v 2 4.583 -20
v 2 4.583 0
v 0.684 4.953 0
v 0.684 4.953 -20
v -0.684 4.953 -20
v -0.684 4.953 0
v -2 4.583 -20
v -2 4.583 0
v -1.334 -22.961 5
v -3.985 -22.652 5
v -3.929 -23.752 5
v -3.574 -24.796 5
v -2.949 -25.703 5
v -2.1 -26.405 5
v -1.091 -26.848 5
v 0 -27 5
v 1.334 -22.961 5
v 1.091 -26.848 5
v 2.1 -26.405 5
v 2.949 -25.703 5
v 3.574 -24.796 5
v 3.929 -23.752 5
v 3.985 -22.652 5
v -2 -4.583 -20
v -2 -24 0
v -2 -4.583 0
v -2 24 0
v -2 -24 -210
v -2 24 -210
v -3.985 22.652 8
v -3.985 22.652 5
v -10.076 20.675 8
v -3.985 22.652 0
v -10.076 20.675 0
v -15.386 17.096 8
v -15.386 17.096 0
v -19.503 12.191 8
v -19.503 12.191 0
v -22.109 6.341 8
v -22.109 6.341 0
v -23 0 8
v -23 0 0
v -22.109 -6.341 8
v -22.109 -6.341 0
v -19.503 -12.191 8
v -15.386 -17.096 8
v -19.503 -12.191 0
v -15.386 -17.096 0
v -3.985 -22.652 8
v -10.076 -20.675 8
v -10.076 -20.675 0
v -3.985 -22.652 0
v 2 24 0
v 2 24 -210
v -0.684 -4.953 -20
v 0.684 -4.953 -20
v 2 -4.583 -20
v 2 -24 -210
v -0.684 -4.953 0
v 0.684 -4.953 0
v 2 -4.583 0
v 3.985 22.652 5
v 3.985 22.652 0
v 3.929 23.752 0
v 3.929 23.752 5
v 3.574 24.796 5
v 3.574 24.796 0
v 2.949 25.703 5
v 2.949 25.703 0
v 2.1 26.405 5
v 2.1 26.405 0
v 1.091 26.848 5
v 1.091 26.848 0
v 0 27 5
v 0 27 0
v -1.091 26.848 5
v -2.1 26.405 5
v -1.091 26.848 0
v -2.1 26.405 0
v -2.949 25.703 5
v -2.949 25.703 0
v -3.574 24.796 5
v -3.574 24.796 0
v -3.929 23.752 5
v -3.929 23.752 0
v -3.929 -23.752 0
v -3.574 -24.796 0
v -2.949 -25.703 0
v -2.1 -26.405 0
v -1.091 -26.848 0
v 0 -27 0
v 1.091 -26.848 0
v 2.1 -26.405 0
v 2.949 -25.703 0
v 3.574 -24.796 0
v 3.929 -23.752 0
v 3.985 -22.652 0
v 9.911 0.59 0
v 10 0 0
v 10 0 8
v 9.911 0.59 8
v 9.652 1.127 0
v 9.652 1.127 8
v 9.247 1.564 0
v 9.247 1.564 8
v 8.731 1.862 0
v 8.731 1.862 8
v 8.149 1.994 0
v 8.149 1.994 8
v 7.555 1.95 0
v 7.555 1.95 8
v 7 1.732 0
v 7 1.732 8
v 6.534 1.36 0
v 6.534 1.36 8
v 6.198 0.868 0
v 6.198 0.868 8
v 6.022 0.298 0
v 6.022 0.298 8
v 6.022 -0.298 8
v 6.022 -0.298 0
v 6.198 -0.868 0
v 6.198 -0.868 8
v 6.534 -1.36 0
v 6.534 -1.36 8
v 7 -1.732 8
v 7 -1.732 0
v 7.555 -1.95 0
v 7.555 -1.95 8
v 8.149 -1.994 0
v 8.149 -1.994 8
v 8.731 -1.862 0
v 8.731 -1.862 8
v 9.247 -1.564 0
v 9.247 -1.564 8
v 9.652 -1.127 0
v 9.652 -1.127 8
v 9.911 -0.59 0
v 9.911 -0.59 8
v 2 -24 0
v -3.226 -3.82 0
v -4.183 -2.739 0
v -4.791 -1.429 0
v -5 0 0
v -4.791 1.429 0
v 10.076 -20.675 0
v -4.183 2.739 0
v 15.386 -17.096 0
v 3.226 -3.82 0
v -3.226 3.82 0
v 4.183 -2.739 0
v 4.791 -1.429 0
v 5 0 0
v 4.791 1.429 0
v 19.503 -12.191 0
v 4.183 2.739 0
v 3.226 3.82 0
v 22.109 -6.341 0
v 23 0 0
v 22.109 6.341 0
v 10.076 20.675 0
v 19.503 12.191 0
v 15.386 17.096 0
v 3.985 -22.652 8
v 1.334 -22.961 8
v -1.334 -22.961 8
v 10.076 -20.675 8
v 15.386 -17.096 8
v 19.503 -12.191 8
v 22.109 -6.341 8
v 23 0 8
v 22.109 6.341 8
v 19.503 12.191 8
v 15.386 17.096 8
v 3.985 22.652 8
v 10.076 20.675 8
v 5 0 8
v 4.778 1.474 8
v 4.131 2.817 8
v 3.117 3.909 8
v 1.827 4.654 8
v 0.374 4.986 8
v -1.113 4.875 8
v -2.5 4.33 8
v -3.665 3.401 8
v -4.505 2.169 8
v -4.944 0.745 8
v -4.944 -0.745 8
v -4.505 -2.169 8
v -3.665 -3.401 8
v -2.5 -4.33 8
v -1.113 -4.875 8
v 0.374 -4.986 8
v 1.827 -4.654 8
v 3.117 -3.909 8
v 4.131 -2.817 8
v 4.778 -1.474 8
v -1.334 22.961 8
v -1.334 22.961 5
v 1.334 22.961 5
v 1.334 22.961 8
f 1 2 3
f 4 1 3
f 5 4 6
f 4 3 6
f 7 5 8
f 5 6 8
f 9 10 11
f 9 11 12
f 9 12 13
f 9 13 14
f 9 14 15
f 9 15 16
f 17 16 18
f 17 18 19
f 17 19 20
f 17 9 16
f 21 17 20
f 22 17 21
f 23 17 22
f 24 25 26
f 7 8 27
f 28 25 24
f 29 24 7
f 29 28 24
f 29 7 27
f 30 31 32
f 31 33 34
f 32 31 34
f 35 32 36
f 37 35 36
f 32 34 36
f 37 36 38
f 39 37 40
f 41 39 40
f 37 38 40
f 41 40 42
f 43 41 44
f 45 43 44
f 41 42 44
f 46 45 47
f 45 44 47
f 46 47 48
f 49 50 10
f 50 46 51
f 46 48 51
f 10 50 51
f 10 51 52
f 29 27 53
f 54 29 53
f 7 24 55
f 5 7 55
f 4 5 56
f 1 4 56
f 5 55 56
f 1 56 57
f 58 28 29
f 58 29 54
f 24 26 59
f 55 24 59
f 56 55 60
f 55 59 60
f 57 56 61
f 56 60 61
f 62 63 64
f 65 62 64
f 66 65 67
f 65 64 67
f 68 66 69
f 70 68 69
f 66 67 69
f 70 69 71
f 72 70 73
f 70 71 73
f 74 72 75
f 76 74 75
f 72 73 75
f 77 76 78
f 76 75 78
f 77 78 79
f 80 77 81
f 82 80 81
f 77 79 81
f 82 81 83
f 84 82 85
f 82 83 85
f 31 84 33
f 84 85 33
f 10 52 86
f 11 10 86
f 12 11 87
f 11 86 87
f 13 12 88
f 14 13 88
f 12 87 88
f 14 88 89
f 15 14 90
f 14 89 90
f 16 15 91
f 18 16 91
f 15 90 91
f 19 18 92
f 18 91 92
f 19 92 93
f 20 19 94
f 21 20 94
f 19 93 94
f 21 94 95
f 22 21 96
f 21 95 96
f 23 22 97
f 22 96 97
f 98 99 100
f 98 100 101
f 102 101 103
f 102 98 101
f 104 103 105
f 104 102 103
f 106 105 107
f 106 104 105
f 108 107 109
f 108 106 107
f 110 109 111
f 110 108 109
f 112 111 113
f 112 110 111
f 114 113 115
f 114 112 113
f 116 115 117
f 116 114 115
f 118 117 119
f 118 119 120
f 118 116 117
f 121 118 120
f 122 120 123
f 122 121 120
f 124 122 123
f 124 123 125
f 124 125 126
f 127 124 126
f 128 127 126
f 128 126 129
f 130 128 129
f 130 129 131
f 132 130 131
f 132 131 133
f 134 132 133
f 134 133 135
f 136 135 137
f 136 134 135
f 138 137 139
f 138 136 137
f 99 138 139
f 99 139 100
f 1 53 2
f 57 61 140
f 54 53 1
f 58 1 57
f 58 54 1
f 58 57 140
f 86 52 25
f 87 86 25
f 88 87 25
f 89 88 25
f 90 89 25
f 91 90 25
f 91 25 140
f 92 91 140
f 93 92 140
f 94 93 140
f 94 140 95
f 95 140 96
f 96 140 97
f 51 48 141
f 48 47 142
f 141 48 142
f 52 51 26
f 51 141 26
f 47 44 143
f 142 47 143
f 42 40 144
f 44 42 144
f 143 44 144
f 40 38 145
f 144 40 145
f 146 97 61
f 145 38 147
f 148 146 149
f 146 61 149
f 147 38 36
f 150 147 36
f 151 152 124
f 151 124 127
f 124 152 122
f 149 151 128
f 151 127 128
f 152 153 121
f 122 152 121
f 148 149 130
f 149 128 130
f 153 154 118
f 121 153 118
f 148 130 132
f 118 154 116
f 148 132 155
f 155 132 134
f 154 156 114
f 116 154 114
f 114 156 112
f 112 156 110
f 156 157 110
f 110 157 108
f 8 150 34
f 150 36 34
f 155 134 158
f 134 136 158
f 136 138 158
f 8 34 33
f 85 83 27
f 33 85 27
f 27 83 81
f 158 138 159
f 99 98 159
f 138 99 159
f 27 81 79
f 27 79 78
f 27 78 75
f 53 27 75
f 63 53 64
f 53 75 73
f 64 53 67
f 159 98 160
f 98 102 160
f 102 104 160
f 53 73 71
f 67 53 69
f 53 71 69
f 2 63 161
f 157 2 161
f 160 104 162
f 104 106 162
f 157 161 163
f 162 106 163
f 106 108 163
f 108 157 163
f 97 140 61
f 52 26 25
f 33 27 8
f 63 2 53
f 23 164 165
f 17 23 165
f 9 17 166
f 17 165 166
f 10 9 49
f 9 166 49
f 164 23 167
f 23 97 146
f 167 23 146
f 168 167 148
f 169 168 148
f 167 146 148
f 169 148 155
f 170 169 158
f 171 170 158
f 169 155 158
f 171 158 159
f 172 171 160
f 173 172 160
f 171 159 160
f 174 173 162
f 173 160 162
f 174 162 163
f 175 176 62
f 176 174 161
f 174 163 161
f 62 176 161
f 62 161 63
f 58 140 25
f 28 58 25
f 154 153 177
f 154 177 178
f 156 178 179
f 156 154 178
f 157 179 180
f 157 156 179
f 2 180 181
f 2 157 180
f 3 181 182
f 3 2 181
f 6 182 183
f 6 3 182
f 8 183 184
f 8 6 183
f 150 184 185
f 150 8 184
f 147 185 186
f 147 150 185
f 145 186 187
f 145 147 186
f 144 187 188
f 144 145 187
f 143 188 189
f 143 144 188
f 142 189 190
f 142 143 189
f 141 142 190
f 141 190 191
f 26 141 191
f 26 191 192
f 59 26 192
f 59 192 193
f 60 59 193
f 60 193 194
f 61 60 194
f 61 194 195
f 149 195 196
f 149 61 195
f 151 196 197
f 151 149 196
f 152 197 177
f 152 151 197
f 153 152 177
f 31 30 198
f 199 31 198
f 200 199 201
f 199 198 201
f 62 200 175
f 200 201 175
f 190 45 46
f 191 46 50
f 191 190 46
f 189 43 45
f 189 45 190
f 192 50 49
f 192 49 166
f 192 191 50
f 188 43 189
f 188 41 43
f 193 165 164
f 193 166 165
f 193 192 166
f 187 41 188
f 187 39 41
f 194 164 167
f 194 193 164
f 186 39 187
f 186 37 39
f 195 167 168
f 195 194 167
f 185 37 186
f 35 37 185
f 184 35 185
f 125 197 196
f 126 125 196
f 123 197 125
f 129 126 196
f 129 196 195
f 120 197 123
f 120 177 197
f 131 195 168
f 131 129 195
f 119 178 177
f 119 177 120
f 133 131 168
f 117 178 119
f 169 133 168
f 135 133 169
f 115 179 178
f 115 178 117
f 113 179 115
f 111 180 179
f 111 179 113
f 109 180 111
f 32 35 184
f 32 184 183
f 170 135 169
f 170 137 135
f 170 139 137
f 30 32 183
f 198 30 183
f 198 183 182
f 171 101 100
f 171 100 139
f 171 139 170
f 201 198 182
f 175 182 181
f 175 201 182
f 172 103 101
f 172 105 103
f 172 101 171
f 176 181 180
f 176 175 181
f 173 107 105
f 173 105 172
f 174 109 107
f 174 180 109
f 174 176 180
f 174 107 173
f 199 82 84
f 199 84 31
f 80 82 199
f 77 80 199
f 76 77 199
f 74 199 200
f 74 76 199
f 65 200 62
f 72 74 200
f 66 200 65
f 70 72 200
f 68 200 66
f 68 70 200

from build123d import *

# Parameters (mm, degrees)
F0_R     = 5
F0_R_2   = 2
F1_DEPTH = 8
F3_DEPTH = 3
F5_DEPTH = 210
F7_DEPTH = 190


with BuildPart() as f1:
    # F0 (on Top) → F1 (new body)
    with BuildSketch(Plane.XY):
        with BuildLine():
            ThreePointArc((3.9848484304, 22.652173913), (0, 27), (-3.9848484304, 22.652173913))
            ThreePointArc((-3.9848484304, 22.652173913), (-23, 0), (-3.9848484304, -22.652173913))
            ThreePointArc((-3.9848484304, -22.652173913), (0, -27), (3.9848484304, -22.652173913))
            ThreePointArc((3.9848484304, -22.652173913), (23, 0), (3.9848484304, 22.652173913))
        make_face()
        Circle(F0_R, mode=Mode.SUBTRACT)
        with Locations((8, 0)):
            Circle(F0_R_2, mode=Mode.SUBTRACT)
    extrude(amount=F1_DEPTH)

    # F2 (on face) → F3 (cut)
    with BuildSketch(Plane.XY.offset(8)):
        with BuildLine():
            ThreePointArc((-3.9848484304, 22.652173913), (0, 23), (3.9848484304, 22.652173913))
            ThreePointArc((3.9848484304, 22.652173913), (0, 27), (-3.9848484304, 22.652173913))
        make_face()
        with BuildLine():
            ThreePointArc((-3.9848484304, -22.652173913), (0, -27), (3.9848484304, -22.652173913))
            ThreePointArc((3.9848484304, -22.652173913), (0, -23), (-3.9848484304, -22.652173913))
        make_face()
    extrude(amount=-F3_DEPTH, mode=Mode.SUBTRACT)

    # F4 (on face) → F5 (join)
    with BuildSketch(Plane(origin=(0, 0, 0), x_dir=(1, 0, 0), z_dir=(0, 0, -1))):
        with BuildLine():
            Line((-2, -4.582575695), (-2, -24))
            Line((-2, -24), (2, -24))
            Line((2, -24), (2, -4.582575695))
            ThreePointArc((2, -4.582575695), (0, -5), (-2, -4.582575695))
        make_face()
        with BuildLine():
            Line((-2, 24), (-2, 4.582575695))
            ThreePointArc((-2, 4.582575695), (0, 5), (2, 4.582575695))
            Line((2, 4.582575695), (2, 24))
            Line((2, 24), (-2, 24))
        make_face()
    extrude(amount=F5_DEPTH)

    # F6 (on face) → F7 (join)
    with BuildSketch(Plane(origin=(0, 0, -210), x_dir=(1, 0, 0), z_dir=(0, 0, -1))):
        with BuildLine():
            ThreePointArc((2, 4.582575695), (0, 5), (-2, 4.582575695))
            Line((-2, 4.582575695), (-2, -4.582575695))
            ThreePointArc((-2, -4.582575695), (0, -5), (2, -4.582575695))
            Line((2, -4.582575695), (2, 4.582575695))
        make_face()
    extrude(amount=-F7_DEPTH)


solid = f1.part
